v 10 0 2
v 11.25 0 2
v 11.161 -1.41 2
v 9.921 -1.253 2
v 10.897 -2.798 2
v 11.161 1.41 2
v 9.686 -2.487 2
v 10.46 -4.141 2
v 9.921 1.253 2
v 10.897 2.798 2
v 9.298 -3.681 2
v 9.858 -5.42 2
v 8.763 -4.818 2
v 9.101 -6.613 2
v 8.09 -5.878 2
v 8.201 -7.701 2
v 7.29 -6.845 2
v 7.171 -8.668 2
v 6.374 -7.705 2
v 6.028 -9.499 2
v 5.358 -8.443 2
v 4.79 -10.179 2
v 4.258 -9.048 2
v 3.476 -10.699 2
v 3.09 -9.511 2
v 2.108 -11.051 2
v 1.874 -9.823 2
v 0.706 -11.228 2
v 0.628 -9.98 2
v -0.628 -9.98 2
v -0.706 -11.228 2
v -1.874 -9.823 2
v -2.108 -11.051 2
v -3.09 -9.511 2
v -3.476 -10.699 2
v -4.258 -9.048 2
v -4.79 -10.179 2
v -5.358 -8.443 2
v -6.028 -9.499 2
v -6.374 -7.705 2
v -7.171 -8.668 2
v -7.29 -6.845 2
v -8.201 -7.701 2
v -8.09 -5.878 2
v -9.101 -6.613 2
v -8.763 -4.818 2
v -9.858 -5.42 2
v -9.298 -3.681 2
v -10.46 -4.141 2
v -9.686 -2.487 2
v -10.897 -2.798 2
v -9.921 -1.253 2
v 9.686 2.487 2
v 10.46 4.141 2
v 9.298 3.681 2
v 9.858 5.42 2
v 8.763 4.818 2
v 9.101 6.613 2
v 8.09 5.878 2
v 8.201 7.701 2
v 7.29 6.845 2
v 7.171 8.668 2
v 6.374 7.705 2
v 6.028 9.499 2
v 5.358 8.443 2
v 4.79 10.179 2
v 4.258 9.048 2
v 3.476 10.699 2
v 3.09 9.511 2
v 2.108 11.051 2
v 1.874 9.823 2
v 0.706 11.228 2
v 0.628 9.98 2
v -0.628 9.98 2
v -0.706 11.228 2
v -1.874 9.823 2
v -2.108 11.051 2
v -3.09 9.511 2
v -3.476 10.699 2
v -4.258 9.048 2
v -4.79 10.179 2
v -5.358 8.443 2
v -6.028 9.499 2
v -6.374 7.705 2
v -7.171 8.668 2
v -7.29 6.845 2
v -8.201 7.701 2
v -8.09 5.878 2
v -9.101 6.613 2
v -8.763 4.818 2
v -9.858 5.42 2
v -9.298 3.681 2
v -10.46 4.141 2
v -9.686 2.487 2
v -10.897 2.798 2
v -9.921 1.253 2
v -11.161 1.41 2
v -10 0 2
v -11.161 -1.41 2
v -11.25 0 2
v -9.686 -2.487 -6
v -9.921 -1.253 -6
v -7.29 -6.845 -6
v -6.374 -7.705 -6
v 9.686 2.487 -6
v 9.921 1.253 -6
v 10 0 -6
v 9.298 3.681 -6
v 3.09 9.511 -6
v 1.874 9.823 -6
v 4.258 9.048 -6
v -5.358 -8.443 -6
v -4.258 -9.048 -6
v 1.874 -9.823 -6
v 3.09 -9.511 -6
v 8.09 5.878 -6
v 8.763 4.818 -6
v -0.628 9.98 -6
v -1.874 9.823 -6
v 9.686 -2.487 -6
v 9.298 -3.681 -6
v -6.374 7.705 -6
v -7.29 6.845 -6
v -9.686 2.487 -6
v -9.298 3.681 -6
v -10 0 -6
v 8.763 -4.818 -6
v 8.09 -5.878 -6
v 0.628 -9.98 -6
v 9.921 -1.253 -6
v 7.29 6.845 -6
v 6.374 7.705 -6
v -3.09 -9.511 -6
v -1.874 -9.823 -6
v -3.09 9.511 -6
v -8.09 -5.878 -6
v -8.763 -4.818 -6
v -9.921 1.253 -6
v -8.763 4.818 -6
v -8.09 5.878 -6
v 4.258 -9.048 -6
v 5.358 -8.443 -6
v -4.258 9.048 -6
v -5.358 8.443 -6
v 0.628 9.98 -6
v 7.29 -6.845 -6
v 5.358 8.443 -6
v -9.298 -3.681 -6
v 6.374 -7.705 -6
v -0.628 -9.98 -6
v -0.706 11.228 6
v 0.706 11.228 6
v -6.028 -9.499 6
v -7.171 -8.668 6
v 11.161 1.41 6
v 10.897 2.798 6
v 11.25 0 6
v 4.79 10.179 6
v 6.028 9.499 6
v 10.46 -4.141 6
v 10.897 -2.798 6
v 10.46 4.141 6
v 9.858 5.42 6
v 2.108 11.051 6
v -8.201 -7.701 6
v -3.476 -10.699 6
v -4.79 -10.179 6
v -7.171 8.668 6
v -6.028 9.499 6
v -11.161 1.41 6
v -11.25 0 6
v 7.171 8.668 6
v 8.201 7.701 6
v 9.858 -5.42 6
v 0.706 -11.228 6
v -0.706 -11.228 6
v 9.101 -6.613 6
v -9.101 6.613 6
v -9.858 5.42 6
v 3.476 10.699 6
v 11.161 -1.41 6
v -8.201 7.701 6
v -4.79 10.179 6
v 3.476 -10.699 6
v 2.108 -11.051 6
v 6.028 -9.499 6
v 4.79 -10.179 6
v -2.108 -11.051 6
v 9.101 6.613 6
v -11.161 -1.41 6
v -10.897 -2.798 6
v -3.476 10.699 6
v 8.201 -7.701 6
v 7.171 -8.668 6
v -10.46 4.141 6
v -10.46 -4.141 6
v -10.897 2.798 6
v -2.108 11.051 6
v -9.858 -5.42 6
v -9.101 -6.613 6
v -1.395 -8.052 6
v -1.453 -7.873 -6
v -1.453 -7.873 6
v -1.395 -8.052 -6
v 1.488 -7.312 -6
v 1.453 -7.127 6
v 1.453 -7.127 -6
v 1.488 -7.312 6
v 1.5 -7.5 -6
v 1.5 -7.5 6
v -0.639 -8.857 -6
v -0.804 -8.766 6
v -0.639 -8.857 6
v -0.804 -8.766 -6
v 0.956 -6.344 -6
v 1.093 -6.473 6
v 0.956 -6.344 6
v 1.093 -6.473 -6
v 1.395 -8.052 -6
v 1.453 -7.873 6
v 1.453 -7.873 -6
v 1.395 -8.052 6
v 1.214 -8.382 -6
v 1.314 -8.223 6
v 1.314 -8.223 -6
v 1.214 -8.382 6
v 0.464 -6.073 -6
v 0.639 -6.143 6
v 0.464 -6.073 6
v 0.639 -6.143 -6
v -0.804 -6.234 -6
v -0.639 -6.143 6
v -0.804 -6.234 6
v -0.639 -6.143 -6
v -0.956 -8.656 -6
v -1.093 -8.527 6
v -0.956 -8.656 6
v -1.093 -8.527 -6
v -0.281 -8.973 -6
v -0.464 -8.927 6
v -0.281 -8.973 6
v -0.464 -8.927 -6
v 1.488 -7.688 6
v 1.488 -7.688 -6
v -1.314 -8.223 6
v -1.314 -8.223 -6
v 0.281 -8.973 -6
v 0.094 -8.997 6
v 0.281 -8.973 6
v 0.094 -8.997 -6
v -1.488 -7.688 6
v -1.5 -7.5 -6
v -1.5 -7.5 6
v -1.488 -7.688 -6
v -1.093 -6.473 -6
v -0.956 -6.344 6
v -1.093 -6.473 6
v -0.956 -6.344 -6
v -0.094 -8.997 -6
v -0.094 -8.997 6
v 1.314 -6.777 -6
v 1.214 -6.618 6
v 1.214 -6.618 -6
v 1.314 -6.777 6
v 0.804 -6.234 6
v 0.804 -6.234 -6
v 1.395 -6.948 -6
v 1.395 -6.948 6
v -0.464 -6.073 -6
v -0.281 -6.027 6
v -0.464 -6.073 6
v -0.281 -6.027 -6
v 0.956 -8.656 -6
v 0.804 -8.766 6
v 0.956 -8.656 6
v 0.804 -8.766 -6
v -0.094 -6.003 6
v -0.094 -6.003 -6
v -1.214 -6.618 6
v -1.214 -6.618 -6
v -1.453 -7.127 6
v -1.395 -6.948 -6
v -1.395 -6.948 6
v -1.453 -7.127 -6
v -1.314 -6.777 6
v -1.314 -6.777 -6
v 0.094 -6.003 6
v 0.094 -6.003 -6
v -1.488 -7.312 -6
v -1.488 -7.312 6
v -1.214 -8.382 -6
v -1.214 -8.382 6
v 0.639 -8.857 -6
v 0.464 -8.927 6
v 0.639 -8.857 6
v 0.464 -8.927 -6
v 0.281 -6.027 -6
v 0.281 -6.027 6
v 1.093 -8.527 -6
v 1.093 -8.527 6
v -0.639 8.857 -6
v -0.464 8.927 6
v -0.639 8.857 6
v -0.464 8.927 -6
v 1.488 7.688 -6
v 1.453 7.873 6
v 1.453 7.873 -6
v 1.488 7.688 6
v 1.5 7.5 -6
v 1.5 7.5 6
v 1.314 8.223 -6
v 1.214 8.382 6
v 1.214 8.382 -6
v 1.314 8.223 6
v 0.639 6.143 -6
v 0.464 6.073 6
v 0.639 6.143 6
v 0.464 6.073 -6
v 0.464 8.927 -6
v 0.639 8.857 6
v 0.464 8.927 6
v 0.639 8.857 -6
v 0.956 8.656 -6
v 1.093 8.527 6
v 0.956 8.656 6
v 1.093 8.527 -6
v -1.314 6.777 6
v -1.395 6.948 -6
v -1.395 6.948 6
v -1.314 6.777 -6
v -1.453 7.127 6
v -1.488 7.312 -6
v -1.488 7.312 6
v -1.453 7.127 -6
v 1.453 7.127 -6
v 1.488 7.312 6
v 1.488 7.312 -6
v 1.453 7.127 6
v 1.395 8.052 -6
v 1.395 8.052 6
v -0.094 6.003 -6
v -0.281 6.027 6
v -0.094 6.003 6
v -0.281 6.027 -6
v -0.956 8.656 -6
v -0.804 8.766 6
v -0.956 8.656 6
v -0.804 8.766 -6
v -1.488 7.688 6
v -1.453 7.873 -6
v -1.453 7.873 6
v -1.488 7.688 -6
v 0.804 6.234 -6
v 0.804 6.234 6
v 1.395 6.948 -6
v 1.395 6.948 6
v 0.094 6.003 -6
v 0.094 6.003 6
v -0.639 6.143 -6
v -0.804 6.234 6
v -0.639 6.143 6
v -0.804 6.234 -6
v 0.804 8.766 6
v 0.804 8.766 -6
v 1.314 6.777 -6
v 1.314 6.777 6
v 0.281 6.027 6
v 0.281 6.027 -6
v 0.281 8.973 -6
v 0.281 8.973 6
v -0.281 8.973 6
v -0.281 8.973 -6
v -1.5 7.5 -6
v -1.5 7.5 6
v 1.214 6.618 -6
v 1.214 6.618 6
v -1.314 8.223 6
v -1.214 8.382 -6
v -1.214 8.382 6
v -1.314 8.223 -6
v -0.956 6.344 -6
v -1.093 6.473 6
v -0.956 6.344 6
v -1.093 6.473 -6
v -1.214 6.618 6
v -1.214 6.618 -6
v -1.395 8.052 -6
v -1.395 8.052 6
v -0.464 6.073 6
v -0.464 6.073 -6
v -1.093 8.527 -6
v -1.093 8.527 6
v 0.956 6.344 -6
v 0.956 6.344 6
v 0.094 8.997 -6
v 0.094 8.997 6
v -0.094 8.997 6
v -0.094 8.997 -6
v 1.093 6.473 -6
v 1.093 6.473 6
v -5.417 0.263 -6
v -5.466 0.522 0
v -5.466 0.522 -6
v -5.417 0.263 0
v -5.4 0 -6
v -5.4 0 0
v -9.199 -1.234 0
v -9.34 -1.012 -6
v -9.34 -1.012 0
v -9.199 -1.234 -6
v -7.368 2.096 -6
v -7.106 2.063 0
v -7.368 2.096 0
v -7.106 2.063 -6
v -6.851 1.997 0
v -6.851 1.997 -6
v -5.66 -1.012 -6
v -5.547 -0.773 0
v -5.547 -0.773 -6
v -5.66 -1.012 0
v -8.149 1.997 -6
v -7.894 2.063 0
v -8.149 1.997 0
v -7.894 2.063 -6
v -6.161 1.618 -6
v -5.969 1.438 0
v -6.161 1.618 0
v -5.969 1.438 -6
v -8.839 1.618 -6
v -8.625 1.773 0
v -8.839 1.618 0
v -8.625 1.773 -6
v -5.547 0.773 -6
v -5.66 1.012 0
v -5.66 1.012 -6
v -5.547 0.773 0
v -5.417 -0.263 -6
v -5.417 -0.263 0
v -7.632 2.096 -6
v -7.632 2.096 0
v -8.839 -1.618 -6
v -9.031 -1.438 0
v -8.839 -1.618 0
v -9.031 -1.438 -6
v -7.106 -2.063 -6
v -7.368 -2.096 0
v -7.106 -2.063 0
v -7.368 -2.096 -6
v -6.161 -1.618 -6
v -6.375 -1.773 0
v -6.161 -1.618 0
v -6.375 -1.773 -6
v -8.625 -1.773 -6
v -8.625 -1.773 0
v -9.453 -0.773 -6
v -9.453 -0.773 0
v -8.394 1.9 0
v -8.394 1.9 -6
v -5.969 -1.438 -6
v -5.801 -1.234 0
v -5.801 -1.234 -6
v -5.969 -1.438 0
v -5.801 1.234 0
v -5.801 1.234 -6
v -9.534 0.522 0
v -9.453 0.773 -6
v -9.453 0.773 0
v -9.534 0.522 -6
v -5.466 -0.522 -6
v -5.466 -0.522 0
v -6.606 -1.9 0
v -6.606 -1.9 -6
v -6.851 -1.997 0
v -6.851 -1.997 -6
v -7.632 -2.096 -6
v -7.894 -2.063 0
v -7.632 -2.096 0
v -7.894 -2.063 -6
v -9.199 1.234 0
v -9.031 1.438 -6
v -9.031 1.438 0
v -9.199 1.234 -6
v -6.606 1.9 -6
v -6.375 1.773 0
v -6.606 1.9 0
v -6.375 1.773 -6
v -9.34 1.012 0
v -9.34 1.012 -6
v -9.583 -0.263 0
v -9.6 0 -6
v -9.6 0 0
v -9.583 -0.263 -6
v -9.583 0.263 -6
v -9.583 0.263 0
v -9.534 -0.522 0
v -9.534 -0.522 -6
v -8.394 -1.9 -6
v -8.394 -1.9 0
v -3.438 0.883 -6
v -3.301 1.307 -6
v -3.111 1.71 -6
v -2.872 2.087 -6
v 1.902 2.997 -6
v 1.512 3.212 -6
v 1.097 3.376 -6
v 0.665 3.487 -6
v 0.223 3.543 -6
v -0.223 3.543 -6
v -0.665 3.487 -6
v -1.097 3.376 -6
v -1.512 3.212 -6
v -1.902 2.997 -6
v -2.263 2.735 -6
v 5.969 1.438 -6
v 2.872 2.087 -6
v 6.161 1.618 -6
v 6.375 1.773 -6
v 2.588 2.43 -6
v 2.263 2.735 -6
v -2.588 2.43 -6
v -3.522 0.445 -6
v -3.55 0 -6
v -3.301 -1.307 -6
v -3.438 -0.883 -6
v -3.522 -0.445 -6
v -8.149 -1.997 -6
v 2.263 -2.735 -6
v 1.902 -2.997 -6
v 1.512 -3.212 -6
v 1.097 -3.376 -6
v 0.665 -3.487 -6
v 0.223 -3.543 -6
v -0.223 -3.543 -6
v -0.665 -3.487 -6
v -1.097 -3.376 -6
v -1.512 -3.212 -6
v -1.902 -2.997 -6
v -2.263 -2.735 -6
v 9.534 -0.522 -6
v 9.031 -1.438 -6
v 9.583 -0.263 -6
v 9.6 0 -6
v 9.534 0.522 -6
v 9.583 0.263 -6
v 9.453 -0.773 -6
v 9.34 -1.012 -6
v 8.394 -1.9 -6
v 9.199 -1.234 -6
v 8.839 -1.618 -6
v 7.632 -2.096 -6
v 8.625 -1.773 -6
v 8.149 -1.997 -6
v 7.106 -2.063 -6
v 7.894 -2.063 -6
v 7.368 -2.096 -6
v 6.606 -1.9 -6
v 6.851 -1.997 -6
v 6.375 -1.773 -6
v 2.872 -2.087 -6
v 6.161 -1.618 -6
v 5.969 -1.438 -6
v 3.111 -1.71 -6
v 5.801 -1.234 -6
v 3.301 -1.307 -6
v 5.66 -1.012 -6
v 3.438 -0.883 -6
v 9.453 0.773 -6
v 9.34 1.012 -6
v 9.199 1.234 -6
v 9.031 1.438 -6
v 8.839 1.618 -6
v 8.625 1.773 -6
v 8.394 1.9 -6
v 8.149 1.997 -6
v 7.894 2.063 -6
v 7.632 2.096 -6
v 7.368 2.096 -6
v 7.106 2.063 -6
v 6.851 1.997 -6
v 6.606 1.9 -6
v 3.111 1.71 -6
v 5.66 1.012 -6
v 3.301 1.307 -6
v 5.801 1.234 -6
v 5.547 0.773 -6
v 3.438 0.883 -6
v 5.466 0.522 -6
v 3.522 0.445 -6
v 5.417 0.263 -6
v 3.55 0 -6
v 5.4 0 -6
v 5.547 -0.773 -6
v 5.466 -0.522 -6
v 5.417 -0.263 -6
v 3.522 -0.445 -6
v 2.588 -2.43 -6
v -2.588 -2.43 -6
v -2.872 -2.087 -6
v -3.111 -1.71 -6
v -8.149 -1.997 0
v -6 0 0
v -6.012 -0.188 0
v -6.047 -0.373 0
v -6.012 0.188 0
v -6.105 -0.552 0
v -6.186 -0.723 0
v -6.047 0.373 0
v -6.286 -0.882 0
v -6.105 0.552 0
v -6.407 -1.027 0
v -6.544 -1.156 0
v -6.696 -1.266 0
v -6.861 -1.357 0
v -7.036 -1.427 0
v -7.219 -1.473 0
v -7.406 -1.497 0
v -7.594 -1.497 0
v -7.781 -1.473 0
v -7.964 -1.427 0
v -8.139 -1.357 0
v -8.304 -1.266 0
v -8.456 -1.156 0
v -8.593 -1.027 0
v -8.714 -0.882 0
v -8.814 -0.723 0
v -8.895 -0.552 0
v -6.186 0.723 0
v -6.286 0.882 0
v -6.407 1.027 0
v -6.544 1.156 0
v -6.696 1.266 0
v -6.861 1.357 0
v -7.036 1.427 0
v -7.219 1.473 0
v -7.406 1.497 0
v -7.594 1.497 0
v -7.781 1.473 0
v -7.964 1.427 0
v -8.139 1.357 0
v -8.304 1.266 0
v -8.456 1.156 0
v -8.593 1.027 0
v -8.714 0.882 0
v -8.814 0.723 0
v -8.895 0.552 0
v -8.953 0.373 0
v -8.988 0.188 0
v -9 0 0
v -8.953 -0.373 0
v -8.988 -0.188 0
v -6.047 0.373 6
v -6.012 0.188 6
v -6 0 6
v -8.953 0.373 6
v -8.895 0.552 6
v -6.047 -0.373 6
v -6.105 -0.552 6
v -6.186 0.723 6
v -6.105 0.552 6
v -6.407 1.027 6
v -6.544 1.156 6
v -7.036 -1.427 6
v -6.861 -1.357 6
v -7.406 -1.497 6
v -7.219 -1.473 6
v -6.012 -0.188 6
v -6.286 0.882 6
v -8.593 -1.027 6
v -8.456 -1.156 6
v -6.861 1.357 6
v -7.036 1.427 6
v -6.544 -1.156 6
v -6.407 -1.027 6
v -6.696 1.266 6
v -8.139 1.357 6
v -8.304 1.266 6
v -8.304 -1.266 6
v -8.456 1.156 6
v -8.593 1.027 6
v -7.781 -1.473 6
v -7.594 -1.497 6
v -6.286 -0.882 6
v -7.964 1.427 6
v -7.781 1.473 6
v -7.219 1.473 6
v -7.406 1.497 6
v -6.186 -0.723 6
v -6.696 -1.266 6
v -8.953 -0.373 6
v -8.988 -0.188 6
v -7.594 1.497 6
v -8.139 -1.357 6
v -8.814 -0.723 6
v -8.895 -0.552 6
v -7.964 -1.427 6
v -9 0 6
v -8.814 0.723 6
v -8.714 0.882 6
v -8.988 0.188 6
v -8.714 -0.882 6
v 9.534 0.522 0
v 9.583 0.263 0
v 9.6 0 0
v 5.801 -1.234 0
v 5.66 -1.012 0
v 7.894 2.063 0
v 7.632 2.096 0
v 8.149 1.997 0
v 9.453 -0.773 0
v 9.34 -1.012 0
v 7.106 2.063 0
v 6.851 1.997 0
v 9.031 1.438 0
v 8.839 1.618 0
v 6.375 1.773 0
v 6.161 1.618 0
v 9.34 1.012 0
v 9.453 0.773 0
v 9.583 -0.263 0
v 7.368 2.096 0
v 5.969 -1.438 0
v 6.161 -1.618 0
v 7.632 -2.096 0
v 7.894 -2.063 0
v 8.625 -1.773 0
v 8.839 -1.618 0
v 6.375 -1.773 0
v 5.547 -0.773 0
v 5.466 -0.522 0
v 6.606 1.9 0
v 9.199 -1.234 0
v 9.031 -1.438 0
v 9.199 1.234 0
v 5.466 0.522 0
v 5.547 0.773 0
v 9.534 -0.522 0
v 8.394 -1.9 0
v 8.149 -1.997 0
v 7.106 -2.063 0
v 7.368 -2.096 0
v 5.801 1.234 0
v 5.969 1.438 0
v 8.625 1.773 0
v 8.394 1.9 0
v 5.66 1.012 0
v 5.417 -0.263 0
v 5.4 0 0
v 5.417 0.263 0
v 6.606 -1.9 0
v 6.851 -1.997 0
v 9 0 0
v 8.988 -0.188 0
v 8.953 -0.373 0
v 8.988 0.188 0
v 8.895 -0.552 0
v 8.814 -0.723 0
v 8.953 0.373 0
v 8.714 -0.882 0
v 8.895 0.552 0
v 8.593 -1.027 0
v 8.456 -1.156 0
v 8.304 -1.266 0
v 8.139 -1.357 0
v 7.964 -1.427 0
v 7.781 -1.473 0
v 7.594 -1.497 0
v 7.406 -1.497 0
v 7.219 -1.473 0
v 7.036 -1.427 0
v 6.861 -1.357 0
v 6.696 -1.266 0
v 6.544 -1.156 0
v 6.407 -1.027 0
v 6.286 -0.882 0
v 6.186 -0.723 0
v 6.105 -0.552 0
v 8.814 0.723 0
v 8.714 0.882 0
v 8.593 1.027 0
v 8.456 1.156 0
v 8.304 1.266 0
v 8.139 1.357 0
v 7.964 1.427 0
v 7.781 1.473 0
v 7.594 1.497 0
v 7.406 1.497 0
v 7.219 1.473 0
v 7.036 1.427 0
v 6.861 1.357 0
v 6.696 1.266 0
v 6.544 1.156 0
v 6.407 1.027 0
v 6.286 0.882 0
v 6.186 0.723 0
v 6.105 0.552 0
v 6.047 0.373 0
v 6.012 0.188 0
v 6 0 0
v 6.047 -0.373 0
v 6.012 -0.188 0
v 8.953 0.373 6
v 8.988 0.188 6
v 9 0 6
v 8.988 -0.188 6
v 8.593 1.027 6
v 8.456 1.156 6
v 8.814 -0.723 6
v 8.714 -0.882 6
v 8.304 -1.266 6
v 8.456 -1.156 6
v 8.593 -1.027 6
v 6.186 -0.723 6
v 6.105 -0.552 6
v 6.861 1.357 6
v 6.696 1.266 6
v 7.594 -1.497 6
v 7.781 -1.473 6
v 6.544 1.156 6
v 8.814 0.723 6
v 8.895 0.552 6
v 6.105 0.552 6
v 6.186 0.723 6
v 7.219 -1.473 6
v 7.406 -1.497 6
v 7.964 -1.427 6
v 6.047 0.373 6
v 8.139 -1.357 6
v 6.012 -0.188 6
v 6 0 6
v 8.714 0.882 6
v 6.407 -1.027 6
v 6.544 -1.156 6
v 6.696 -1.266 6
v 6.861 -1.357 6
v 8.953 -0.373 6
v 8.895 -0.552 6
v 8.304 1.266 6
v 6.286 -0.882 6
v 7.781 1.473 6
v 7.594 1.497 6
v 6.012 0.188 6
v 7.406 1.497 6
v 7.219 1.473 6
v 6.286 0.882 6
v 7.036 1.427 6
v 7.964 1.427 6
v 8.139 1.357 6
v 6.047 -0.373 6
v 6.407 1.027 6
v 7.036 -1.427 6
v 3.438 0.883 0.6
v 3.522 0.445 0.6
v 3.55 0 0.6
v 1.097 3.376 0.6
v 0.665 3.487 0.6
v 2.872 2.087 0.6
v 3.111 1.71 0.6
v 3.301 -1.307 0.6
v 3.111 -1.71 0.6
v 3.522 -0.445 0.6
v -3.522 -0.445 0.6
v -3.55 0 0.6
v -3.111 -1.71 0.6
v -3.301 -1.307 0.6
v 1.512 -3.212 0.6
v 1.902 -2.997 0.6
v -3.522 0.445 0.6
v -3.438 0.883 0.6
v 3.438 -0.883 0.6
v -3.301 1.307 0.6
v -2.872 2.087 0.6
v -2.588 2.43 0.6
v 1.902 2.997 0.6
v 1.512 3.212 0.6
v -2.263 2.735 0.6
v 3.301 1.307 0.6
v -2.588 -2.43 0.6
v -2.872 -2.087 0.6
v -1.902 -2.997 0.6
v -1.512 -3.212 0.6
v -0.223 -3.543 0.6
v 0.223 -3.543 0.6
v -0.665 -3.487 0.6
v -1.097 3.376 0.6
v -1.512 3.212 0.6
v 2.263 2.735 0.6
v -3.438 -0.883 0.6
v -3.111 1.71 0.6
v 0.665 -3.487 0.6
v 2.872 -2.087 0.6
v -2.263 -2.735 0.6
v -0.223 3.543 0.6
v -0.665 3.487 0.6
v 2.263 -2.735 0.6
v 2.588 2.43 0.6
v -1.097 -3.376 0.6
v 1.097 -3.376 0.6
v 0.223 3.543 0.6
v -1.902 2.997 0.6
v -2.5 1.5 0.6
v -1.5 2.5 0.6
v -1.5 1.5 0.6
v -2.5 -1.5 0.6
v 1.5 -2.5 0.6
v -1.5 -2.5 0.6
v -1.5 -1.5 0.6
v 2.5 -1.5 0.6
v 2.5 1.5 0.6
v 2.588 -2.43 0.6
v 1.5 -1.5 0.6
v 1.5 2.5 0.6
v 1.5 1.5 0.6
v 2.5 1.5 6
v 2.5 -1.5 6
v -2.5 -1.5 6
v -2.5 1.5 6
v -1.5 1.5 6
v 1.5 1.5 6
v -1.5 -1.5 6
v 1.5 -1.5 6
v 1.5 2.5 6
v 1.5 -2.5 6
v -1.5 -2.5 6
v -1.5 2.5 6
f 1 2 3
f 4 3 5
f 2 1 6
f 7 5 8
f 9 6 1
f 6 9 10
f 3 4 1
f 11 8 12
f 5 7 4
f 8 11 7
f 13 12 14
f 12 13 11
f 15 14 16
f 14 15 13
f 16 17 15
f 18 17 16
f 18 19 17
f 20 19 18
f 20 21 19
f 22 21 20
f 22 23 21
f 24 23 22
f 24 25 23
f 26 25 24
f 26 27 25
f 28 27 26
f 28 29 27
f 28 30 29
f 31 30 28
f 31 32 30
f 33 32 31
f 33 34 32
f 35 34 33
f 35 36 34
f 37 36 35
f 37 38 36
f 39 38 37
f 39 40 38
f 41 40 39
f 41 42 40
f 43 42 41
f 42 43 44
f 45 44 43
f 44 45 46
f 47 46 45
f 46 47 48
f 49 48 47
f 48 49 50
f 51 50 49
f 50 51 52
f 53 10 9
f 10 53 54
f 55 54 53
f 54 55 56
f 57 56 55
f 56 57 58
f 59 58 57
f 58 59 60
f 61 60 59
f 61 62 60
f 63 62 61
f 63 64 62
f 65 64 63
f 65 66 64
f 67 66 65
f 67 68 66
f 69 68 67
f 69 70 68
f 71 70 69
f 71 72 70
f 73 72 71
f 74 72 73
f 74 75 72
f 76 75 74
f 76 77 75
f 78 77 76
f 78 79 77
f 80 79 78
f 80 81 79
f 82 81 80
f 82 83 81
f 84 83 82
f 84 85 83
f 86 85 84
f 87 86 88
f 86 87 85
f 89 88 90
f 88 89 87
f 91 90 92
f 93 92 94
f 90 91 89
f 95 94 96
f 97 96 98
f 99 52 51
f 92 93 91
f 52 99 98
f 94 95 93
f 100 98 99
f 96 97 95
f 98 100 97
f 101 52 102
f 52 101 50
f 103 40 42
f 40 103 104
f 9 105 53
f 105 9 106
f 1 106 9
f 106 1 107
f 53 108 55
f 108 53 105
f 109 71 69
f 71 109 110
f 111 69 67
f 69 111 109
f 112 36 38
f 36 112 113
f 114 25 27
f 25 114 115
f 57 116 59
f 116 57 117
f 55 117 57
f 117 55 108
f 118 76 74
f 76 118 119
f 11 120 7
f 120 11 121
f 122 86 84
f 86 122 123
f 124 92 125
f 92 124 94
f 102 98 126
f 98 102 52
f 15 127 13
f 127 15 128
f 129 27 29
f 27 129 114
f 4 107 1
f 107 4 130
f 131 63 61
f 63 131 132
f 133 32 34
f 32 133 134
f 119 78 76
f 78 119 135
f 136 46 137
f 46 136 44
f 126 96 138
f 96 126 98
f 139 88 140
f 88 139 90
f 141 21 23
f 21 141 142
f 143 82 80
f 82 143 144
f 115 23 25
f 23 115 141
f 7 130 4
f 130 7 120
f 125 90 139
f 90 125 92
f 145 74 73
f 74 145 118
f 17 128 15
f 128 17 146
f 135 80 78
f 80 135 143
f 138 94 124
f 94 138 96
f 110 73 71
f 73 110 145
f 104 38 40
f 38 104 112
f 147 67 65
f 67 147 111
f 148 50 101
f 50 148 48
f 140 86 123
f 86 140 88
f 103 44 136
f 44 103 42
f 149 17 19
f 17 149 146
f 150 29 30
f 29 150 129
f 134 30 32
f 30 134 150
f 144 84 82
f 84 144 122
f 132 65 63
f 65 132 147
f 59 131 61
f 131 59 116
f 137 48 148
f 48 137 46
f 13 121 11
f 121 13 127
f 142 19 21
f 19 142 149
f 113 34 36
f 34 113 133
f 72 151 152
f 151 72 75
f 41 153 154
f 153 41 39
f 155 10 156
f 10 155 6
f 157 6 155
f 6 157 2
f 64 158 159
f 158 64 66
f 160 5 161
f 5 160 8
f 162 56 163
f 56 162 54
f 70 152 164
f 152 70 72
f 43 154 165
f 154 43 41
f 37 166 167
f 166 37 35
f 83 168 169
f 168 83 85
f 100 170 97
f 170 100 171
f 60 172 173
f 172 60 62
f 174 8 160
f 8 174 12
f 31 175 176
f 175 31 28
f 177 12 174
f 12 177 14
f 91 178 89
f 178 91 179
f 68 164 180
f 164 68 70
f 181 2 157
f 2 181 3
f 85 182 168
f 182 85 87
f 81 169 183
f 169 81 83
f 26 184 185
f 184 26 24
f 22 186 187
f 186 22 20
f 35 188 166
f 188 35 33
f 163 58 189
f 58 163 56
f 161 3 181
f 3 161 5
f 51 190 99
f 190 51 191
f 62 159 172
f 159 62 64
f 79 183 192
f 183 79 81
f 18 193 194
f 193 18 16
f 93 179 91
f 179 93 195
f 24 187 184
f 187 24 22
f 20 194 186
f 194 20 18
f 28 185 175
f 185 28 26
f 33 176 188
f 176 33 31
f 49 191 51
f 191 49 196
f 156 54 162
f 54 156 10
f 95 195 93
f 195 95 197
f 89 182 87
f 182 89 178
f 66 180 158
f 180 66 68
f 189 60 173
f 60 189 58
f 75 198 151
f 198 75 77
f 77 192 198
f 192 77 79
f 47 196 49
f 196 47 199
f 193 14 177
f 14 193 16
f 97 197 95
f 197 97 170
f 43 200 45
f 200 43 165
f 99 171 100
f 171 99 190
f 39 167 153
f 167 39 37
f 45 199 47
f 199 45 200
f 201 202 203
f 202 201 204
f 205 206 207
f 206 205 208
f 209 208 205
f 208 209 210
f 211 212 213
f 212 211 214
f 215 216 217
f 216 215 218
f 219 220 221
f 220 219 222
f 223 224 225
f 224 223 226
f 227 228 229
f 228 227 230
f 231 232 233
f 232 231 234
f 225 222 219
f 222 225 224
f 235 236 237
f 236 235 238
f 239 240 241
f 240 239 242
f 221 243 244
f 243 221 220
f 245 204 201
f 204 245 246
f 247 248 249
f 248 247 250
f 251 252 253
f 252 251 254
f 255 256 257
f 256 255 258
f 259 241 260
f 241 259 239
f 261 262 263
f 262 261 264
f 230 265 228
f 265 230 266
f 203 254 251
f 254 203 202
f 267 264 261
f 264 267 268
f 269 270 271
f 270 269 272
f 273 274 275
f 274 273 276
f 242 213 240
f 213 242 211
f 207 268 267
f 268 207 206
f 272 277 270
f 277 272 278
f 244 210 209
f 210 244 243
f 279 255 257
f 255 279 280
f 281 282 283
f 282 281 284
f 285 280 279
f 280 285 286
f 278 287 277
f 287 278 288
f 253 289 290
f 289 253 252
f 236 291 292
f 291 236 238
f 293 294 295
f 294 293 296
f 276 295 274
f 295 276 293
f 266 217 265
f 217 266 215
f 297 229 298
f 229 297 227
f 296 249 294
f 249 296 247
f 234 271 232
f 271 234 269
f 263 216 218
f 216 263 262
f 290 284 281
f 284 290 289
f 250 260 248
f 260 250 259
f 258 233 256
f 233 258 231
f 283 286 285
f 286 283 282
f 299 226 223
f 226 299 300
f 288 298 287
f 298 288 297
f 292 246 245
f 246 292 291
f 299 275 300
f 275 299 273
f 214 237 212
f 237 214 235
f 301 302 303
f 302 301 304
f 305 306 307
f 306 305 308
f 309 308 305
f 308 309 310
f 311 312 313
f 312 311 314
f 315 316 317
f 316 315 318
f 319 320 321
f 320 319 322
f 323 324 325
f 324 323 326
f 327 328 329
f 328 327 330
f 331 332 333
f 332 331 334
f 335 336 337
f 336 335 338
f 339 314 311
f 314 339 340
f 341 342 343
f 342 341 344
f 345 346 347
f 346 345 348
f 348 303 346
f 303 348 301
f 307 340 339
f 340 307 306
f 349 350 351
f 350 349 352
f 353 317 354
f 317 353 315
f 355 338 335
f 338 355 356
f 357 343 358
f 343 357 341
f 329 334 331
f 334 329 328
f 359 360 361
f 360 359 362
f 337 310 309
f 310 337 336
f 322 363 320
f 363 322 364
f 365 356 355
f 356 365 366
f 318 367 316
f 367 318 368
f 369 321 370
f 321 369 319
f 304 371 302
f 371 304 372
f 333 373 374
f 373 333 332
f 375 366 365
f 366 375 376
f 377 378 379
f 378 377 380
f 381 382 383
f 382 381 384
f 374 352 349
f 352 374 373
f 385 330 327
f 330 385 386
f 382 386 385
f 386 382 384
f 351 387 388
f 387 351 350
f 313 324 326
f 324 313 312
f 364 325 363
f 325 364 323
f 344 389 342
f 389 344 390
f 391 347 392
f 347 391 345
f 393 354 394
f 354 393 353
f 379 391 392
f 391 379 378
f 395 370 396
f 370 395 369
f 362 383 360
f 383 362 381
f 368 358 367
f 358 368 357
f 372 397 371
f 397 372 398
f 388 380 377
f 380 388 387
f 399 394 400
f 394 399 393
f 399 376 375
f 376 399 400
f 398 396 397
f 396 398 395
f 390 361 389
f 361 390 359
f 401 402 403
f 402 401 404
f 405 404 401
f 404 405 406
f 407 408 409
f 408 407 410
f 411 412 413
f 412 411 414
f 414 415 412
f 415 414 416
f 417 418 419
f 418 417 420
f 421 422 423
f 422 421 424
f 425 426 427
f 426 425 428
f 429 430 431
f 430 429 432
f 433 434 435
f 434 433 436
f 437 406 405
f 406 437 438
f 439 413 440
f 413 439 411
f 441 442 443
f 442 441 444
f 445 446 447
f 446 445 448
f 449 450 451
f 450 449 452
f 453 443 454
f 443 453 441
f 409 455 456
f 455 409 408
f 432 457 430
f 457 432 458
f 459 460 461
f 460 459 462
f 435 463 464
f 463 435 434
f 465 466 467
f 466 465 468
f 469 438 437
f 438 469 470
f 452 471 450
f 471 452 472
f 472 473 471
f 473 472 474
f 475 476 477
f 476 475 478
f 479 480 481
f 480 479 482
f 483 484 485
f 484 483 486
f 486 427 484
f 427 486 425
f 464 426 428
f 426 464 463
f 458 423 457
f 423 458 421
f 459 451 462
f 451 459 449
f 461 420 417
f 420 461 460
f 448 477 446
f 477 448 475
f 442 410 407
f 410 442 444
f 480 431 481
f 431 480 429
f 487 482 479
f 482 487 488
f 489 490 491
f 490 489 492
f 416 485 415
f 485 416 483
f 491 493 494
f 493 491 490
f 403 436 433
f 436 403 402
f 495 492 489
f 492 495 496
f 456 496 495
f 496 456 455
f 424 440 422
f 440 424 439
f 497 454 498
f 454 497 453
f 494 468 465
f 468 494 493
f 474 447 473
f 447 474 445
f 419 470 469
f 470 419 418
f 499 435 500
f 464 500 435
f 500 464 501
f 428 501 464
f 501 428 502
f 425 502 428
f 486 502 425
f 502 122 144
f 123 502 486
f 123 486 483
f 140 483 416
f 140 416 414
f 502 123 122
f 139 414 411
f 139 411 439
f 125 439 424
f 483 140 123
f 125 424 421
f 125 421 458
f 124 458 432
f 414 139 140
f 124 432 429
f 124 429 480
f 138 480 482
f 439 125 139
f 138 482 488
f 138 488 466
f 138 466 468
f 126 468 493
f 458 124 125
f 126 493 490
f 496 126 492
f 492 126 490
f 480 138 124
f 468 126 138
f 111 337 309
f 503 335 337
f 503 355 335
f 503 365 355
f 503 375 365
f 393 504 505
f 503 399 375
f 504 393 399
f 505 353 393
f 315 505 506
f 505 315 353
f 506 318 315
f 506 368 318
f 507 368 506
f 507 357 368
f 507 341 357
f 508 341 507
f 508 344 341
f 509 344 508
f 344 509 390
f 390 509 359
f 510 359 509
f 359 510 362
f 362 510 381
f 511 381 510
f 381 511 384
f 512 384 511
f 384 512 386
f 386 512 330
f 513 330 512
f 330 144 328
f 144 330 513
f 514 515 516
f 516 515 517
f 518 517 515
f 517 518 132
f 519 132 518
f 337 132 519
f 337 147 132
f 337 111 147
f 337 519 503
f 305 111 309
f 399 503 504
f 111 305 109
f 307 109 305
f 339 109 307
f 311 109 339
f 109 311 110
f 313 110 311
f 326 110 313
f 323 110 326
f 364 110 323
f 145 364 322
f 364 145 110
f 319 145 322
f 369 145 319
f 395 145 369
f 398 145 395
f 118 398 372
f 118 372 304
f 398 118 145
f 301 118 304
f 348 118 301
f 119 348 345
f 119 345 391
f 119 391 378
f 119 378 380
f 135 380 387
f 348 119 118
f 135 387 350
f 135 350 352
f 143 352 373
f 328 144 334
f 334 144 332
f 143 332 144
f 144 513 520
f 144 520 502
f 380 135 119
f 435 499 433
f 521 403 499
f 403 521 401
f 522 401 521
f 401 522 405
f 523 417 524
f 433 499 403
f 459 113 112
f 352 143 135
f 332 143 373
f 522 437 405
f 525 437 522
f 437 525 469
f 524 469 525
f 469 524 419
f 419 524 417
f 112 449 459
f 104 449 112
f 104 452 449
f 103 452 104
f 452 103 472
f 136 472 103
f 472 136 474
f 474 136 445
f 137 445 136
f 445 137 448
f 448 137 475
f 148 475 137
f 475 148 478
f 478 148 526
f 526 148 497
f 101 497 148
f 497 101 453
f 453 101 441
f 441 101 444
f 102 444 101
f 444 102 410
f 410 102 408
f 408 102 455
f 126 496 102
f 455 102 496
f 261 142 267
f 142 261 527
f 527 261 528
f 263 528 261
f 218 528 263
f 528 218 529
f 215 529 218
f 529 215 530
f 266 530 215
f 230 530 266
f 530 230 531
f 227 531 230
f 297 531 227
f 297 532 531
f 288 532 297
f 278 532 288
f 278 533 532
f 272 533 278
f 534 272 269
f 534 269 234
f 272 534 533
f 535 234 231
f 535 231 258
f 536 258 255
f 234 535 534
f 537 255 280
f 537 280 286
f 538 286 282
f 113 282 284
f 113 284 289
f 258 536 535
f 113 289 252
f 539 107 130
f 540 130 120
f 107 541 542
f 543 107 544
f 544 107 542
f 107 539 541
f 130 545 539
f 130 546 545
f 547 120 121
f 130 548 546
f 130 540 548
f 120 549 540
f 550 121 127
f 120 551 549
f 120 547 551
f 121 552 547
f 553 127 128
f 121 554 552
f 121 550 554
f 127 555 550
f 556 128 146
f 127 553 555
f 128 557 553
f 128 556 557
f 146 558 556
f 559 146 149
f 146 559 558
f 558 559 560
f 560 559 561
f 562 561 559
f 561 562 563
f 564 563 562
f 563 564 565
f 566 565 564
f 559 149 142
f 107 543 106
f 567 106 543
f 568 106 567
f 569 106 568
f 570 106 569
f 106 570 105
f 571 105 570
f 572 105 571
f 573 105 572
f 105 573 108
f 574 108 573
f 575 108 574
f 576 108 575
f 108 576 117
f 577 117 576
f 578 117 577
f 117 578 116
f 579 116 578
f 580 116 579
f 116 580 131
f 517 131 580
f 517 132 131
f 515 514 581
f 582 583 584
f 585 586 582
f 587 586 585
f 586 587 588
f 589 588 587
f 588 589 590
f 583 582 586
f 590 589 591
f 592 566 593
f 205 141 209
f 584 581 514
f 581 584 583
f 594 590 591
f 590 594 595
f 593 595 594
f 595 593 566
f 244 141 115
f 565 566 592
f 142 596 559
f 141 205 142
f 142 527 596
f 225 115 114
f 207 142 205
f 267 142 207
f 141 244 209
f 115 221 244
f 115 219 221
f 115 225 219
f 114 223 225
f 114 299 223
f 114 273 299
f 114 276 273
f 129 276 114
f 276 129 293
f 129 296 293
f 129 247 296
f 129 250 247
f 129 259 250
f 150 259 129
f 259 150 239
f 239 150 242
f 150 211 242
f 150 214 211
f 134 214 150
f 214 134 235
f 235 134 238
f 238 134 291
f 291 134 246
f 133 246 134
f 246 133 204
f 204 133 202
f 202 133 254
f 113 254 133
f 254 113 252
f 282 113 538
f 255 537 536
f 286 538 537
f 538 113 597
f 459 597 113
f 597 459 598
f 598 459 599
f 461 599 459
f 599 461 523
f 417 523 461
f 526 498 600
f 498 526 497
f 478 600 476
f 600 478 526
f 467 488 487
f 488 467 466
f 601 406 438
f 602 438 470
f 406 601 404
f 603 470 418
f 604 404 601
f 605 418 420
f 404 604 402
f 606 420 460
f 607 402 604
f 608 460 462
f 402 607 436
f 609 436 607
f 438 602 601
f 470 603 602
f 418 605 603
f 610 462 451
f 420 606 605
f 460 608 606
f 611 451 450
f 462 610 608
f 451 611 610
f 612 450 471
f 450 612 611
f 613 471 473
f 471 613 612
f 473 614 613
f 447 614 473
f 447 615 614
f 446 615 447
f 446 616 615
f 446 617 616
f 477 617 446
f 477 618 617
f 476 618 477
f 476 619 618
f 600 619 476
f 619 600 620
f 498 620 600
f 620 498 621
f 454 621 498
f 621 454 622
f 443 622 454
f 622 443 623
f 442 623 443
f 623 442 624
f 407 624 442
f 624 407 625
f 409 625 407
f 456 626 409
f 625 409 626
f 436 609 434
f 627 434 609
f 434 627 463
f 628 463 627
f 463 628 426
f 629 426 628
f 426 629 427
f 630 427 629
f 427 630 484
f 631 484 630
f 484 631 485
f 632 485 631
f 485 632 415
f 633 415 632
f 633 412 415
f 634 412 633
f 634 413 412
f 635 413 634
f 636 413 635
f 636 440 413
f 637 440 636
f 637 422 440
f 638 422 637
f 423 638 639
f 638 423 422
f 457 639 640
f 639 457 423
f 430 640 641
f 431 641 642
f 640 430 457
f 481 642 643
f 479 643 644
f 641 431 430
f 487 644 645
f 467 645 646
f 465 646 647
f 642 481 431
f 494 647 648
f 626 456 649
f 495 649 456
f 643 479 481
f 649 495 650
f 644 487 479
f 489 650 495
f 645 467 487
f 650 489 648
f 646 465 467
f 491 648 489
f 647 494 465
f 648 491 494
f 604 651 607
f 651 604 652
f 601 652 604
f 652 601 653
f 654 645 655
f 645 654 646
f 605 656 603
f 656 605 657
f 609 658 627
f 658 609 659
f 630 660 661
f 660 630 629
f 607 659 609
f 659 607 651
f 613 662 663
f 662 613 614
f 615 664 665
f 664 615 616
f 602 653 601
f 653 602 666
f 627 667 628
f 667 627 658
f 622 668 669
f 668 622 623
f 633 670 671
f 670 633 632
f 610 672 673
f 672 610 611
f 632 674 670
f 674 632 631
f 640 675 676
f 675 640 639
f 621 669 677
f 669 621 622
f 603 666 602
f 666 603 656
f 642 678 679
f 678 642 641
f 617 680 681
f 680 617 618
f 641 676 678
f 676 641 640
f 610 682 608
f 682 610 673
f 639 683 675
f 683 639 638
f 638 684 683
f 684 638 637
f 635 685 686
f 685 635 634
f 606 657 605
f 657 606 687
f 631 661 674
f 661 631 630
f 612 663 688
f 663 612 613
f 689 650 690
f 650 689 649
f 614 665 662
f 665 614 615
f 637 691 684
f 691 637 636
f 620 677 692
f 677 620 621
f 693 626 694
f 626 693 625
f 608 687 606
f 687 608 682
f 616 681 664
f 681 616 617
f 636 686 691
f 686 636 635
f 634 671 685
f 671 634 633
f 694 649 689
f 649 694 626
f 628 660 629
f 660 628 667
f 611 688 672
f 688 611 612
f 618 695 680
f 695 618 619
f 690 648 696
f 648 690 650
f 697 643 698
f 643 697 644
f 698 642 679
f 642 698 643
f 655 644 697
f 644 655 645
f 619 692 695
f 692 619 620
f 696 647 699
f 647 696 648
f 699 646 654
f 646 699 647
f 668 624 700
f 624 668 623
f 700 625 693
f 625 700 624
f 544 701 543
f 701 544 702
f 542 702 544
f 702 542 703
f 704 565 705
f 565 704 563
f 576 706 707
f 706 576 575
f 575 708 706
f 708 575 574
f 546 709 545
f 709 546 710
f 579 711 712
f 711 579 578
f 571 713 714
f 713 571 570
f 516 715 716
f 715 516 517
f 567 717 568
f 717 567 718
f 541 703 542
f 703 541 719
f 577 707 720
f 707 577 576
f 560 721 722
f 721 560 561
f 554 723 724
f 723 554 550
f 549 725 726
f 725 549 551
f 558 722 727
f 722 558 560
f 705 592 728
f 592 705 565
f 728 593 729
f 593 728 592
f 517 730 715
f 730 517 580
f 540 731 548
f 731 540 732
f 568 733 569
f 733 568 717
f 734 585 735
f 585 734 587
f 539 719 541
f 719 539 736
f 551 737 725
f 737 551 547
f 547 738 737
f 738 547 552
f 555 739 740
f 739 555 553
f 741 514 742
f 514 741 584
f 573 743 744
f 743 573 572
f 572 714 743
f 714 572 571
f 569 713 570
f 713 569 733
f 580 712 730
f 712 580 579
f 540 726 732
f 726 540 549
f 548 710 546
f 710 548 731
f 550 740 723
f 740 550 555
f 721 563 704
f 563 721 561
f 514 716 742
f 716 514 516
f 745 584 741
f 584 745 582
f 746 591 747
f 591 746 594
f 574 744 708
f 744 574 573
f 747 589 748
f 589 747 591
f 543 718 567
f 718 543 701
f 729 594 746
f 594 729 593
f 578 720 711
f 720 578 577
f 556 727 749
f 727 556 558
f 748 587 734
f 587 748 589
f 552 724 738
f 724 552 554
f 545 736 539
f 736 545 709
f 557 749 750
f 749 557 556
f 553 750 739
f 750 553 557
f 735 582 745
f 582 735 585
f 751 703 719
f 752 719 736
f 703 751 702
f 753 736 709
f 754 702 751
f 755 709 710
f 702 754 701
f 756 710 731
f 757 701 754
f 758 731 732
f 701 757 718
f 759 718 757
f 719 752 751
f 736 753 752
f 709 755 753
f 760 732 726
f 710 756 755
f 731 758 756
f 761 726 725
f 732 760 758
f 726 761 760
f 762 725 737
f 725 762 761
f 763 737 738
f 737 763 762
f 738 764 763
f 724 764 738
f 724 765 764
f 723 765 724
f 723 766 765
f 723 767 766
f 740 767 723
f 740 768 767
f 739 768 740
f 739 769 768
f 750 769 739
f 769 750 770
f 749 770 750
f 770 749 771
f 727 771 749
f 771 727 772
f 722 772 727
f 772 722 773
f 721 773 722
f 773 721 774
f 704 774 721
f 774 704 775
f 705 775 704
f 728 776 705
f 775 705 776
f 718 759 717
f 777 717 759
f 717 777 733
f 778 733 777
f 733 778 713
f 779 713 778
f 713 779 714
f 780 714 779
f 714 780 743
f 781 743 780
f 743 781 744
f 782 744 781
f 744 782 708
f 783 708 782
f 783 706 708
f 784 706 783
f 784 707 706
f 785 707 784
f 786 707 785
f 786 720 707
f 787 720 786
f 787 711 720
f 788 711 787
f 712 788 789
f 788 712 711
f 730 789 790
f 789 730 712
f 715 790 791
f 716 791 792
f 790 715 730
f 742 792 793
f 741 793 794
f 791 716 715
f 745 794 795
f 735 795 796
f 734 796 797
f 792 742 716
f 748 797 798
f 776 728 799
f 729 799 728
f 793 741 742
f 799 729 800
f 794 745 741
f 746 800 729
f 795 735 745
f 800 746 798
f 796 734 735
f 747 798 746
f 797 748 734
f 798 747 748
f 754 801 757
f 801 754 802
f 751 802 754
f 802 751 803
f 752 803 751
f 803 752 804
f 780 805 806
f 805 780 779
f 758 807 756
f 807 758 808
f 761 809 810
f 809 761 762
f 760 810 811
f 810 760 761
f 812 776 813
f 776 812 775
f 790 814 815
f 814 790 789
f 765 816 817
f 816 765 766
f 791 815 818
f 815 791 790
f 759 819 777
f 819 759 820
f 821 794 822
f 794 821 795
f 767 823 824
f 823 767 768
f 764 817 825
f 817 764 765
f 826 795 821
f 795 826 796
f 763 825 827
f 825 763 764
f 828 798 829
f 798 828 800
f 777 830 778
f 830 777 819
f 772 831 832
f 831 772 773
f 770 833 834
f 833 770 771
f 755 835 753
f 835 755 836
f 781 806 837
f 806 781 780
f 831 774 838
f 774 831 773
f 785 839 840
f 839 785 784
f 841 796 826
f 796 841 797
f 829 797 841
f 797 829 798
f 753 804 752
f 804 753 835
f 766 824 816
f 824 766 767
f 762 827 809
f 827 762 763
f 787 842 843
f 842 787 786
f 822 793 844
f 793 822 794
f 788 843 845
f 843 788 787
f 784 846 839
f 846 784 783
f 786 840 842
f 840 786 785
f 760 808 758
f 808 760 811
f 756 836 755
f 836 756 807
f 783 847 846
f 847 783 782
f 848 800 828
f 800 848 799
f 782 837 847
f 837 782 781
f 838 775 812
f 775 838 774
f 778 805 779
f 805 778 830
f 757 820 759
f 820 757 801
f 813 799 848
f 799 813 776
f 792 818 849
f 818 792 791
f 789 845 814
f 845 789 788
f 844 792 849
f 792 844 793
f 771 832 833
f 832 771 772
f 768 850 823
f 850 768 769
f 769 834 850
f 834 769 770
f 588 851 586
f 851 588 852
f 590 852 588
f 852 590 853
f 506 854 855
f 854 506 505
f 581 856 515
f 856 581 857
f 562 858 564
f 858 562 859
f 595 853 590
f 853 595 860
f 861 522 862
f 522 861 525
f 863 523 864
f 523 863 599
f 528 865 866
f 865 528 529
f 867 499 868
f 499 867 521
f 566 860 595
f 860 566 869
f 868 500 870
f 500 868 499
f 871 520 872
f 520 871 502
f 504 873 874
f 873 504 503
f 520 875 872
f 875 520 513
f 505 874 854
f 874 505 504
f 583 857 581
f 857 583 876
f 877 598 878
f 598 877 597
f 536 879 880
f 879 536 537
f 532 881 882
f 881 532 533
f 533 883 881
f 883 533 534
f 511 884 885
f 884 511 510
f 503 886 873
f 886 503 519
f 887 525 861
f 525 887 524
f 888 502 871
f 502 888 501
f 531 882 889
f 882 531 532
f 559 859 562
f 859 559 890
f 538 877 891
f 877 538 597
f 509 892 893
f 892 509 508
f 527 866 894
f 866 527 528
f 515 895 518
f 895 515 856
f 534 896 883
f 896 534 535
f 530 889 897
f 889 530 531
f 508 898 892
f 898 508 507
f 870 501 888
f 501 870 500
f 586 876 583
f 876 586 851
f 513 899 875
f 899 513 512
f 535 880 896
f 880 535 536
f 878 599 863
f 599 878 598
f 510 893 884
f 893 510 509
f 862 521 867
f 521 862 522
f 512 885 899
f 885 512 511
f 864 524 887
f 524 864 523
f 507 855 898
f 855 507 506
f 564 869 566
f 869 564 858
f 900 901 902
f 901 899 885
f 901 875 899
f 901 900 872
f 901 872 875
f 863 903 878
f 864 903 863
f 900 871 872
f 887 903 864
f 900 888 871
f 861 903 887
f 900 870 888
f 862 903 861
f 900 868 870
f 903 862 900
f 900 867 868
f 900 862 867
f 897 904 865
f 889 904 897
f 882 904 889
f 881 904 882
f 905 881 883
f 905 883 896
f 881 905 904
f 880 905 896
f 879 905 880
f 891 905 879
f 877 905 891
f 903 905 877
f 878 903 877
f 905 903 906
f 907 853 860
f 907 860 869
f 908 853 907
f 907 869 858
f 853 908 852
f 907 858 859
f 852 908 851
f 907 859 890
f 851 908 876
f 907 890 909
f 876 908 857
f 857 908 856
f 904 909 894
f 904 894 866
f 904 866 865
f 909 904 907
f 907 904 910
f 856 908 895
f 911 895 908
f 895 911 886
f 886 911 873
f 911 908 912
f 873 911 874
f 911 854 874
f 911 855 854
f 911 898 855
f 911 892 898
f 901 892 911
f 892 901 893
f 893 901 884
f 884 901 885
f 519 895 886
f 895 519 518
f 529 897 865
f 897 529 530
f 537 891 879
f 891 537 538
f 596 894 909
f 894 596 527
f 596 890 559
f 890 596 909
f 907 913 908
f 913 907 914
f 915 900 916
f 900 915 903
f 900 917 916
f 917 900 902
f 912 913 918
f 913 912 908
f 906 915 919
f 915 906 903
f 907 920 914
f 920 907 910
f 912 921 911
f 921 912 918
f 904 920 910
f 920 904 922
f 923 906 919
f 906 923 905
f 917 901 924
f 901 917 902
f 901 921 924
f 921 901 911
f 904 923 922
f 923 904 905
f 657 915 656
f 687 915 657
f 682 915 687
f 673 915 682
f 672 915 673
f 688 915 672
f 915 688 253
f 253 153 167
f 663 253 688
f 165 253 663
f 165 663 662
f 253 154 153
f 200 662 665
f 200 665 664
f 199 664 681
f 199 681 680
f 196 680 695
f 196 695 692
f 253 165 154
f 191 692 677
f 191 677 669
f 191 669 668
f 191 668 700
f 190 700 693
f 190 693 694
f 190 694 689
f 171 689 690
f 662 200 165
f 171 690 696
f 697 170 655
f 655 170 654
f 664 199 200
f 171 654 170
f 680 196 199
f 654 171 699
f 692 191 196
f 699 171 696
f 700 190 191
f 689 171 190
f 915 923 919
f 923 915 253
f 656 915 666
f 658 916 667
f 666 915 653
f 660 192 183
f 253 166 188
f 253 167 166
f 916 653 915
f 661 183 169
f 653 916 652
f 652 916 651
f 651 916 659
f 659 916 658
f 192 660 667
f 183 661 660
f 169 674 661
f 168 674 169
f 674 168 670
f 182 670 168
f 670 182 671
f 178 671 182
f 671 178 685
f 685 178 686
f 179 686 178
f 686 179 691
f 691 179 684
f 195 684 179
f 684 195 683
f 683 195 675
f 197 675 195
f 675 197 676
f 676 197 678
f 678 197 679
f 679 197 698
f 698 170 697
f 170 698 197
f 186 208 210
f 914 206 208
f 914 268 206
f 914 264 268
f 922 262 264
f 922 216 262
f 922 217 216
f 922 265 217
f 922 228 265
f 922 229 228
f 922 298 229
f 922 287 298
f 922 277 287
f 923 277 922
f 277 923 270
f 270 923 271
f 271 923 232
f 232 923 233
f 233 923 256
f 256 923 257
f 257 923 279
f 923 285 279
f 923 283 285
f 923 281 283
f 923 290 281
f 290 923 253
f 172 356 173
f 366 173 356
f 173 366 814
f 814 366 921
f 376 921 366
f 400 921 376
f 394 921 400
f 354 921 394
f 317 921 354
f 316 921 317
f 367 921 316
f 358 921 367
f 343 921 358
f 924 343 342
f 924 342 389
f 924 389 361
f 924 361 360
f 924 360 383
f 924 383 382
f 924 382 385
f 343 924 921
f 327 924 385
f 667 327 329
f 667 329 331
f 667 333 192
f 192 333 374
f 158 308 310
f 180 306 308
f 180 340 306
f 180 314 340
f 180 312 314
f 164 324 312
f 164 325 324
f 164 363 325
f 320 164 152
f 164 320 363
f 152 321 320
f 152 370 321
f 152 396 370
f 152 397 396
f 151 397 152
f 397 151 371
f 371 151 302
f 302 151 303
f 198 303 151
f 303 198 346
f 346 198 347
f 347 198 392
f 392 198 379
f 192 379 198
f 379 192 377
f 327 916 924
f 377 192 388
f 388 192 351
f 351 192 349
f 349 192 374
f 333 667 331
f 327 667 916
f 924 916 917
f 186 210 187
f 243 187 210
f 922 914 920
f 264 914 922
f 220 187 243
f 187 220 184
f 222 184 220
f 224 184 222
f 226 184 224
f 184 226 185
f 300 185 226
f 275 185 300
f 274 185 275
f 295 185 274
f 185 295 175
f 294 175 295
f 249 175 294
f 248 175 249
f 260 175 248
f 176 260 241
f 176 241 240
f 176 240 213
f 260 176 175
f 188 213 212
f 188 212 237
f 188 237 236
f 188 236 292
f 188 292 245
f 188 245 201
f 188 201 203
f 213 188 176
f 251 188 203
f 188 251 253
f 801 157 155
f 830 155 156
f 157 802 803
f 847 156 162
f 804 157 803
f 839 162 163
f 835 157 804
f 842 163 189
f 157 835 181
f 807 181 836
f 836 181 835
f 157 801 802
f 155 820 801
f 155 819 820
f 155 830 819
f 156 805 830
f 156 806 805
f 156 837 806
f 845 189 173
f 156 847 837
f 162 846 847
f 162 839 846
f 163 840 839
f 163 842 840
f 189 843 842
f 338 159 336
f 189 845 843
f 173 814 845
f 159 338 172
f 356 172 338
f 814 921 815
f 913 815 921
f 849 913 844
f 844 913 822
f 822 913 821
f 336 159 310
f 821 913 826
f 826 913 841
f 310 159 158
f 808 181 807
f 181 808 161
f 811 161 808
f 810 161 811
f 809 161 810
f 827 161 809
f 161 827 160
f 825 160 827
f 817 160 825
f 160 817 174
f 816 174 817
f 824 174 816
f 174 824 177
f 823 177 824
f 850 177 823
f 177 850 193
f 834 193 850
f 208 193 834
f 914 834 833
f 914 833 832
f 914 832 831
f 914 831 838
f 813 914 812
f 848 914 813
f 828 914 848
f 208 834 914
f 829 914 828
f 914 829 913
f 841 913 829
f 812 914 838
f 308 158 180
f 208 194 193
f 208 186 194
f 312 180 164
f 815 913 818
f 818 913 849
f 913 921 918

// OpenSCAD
$fn = 50;

difference() {
	union() {
		translate(v = [0, 0, 0]) {
			rotate(a = [0, 0, 0]) {
				difference() {
					union() {
						translate(v = [0, 0, -6.0]) {
							cylinder(h = 12, r = 12);
						}
					}
					union() {
						translate(v = [0, 0, 0]) {
							rotate(a = [0, 0, 0]) {
								difference() {
									union() {
										translate(v = [0, 0, -2.0]) {
											cylinder(h = 4, r = 13.5);
										}
									}
									union() {
										translate(v = [0, 0, -2.01]) {
											cylinder(h = 4.02, r = 10.0);
										}
									}
								}
							}
						}
						translate(v = [0, 0, -3]) {
							rotate(a = [0, 0, 0]) {
								difference() {
									union() {
										translate(v = [0, 0, -2.0]) {
											cylinder(h = 4, r = 13.5);
										}
									}
									union() {
										translate(v = [0, 0, -2.01]) {
											cylinder(h = 4.02, r = 10.0);
										}
									}
								}
							}
						}
						translate(v = [0, 0, -6]) {
							rotate(a = [0, 0, 0]) {
								difference() {
									union() {
										translate(v = [0, 0, -2.0]) {
											cylinder(h = 4, r = 13.5);
										}
									}
									union() {
										translate(v = [0, 0, -2.01]) {
											cylinder(h = 4.02, r = 10.0);
										}
									}
								}
							}
						}
						translate(v = [0, 0, 0]) {
							rotate(a = [0, 0, 0]) {
								difference() {
									union() {
										translate(v = [0, 0, -21.0]) {
											cylinder(h = 42, r = 12.25);
										}
									}
									union() {
										translate(v = [0, 0, -21.01]) {
											cylinder(h = 42.02, r = 11.25);
										}
									}
								}
							}
						}
						translate(v = [0.0, -7.5, -7.0]) {
							cylinder(h = 14, r = 1.5);
						}
						translate(v = [0.0, 7.5, -7.0]) {
							cylinder(h = 14, r = 1.5);
						}
						translate(v = [-7.5, 0, -6.0]) {
							cylinder(h = 6, r = 2.1);
						}
						translate(v = [-7.5, 0, -7.0]) {
							cylinder(h = 14, r = 1.5);
						}
						translate(v = [7.5, 0, -6.0]) {
							cylinder(h = 6, r = 2.1);
						}
						translate(v = [7.5, 0, -7.0]) {
							cylinder(h = 14, r = 1.5);
						}
						translate(v = [0, 0, -6.000000000000001]) {
							cylinder(h = 6.6, r = 3.55);
						}
						translate(v = [-2.5, -1.5, -7.0]) {
							cube(size = [5, 3, 14]);
						}
						translate(v = [-1.5, -2.5, -7.0]) {
							cube(size = [3, 5, 14]);
						}
					}
				}
			}
		}
	}
	union();
}
